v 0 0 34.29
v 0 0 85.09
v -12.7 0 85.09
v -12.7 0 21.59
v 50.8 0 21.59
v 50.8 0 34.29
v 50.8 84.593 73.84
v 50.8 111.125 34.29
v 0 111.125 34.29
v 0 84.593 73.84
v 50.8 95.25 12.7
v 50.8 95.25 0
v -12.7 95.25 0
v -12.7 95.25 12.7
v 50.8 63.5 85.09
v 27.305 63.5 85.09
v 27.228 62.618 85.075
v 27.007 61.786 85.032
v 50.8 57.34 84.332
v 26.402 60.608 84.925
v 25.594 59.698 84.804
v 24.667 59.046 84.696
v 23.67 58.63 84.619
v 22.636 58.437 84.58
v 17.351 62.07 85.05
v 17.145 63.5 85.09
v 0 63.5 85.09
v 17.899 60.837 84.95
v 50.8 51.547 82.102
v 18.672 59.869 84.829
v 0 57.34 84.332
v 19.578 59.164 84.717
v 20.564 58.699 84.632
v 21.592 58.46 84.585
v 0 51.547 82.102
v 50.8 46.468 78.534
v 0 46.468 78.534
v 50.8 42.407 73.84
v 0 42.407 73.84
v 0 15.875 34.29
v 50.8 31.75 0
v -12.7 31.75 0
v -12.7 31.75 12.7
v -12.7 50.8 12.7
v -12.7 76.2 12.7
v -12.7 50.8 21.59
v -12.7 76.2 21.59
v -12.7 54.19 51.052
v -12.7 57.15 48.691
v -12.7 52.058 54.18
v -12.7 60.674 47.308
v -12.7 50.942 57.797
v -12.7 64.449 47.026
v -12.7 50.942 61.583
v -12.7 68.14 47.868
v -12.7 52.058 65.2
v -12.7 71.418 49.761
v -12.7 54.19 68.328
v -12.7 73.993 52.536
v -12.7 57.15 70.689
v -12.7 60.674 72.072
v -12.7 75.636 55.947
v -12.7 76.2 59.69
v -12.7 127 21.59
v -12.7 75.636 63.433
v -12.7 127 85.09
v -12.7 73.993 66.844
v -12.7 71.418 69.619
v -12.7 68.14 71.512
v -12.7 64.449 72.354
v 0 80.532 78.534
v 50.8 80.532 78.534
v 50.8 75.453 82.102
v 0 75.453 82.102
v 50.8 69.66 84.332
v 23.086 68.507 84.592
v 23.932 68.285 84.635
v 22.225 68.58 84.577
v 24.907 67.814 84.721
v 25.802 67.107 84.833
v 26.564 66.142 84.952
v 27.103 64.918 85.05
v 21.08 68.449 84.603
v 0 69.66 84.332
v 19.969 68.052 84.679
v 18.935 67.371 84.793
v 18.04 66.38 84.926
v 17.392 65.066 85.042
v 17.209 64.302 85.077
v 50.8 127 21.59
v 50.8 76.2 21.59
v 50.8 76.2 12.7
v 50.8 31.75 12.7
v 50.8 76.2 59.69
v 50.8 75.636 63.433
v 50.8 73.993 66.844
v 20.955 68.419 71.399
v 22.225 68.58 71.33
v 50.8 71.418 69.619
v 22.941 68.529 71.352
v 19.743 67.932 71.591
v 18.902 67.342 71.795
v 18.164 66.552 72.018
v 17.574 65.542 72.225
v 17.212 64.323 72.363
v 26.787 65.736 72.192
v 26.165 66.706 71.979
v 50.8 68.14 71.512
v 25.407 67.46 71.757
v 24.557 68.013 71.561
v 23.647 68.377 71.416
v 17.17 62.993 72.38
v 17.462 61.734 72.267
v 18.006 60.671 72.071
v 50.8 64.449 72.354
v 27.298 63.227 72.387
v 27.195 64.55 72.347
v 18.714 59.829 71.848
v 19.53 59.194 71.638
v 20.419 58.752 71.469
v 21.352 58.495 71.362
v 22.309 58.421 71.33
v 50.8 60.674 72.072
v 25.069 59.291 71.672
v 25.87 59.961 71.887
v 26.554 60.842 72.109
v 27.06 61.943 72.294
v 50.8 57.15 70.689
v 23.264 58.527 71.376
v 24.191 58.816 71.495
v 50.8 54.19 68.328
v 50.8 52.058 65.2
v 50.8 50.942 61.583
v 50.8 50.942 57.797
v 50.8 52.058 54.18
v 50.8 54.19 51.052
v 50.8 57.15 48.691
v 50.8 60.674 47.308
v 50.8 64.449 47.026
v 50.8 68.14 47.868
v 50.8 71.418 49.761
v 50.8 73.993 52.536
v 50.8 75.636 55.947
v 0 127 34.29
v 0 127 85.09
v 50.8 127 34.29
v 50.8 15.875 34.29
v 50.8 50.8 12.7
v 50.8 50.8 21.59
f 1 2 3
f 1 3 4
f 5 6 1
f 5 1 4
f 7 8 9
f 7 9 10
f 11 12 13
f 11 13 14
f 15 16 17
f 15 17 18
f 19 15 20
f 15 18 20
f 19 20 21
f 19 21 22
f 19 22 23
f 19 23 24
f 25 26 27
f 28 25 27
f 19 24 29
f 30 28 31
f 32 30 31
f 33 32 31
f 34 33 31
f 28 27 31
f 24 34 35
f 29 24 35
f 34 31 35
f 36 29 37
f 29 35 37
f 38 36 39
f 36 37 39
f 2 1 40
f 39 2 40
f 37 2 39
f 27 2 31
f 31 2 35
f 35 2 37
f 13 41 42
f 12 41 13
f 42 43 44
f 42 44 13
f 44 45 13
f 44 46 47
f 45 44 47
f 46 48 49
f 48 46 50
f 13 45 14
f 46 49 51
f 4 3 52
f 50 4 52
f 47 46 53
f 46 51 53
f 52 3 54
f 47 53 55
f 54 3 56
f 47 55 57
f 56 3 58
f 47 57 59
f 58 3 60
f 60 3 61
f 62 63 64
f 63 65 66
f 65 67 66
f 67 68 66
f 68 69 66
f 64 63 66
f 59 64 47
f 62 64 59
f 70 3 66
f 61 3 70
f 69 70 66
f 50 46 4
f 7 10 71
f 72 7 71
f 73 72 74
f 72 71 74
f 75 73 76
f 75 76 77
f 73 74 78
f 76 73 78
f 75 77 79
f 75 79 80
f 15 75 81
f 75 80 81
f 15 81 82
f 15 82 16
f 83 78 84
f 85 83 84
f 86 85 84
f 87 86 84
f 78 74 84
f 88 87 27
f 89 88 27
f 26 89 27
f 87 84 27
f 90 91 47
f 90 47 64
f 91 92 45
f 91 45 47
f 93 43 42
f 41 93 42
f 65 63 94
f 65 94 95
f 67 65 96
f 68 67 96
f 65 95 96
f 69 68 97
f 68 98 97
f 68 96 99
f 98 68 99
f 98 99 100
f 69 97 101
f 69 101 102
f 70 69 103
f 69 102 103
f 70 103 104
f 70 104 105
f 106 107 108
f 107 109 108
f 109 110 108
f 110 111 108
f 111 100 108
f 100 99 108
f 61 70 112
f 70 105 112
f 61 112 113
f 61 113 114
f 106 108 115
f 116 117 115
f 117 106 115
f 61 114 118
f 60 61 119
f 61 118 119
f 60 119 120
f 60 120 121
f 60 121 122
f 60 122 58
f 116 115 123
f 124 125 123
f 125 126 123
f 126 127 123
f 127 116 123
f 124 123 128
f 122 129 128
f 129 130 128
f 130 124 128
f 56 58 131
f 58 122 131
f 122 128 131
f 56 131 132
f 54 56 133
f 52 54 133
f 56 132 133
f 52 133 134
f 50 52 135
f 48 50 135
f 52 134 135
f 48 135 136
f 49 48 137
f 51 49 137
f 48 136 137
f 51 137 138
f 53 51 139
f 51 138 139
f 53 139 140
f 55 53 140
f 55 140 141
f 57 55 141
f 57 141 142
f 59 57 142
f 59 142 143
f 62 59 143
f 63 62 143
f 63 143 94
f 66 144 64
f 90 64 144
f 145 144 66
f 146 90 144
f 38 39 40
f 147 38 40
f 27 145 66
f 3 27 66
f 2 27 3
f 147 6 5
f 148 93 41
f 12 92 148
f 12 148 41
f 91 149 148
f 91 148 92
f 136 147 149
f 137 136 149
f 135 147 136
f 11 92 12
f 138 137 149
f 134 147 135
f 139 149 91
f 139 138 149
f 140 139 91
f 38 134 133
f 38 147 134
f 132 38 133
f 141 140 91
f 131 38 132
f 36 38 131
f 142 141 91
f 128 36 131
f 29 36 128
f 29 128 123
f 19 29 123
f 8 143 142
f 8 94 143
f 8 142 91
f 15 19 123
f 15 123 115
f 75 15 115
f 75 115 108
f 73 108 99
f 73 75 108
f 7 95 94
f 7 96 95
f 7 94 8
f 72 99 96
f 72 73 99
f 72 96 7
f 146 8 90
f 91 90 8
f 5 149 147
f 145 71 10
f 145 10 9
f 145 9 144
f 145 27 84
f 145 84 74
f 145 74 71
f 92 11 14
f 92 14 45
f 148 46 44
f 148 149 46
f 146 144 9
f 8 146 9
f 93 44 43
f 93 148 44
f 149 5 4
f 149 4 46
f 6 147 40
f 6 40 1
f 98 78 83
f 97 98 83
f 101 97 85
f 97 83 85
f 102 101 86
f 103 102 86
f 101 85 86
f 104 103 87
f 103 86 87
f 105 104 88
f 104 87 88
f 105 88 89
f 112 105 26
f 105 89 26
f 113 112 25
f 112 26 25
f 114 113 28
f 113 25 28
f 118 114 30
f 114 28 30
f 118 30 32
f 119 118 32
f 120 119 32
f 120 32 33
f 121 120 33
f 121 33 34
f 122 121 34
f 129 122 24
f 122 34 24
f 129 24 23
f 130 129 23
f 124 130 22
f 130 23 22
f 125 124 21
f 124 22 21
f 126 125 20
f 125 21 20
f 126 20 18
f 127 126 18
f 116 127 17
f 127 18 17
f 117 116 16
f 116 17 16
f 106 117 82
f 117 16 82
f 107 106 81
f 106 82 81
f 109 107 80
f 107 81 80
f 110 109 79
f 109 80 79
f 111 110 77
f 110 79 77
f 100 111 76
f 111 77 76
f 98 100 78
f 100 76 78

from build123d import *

# Parameters (mm, degrees)
F0_R     = 12.7
F1_DEPTH = 50.8
F2_DEPTH = 12.7
F3_R     = 5.08
F4_DEPTH = 13.7612578348
F5_ANGLE = 90


with BuildPart() as f1:
    # F0 (on Front) → F1 (new body)
    with BuildSketch(Plane.XZ):
        with BuildLine():
            Line((31.75, 12.7), (31.75, 0))
            Line((31.75, 0), (95.25, 0))
            Line((95.25, 0), (95.25, 12.7))
            Line((95.25, 12.7), (76.2, 12.7))
            Line((76.2, 12.7), (76.2, 21.59))
            Line((76.2, 21.59), (127, 21.59))
            Line((127, 21.59), (127, 34.29))
            Line((127, 34.29), (111.125, 34.29))
            Line((111.125, 34.29), (84.5934256055, 73.8401730104))
            ThreePointArc((84.5934256055, 73.8401730104), (75.4529411765, 82.1017647059), (63.5, 85.09))
            ThreePointArc((63.5, 85.09), (51.5470588235, 82.1017647059), (42.4065743945, 73.8401730104))
            Line((42.4065743945, 73.8401730104), (15.875, 34.29))
            Line((15.875, 34.29), (0, 34.29))
            Line((0, 34.29), (0, 21.59))
            Line((0, 21.59), (50.8, 21.59))
            Line((50.8, 21.59), (50.8, 12.7))
            Line((50.8, 12.7), (31.75, 12.7))
        make_face()
        with Locations((63.5, 59.69)):
            Circle(F0_R, mode=Mode.SUBTRACT)
    extrude(amount=F1_DEPTH)

    # F0 (on Front) → F2 (join)
    with BuildSketch(Plane.XZ):
        with BuildLine():
            Line((31.75, 12.7), (31.75, 0))
            Line((31.75, 0), (95.25, 0))
            Line((95.25, 0), (95.25, 12.7))
            Line((95.25, 12.7), (76.2, 12.7))
            Line((76.2, 12.7), (76.2, 21.59))
            Line((76.2, 21.59), (127, 21.59))
            Line((127, 21.59), (127, 34.29))
            Line((127, 34.29), (111.125, 34.29))
            Line((111.125, 34.29), (84.5934256055, 73.8401730104))
            ThreePointArc((84.5934256055, 73.8401730104), (75.4529411765, 82.1017647059), (63.5, 85.09))
            ThreePointArc((63.5, 85.09), (51.5470588235, 82.1017647059), (42.4065743945, 73.8401730104))
            Line((42.4065743945, 73.8401730104), (15.875, 34.29))
            Line((15.875, 34.29), (0, 34.29))
            Line((0, 34.29), (0, 21.59))
            Line((0, 21.59), (50.8, 21.59))
            Line((50.8, 21.59), (50.8, 12.7))
            Line((50.8, 12.7), (31.75, 12.7))
        make_face()
        with Locations((63.5, 59.69)):
            Circle(F0_R, mode=Mode.SUBTRACT)
        with BuildLine():
            Line((0, 85.09), (0, 34.29))
            Line((0, 34.29), (15.875, 34.29))
            Line((15.875, 34.29), (42.4065743945, 73.8401730104))
            ThreePointArc((42.4065743945, 73.8401730104), (51.5470588235, 82.1017647059), (63.5, 85.09))
            Line((63.5, 85.09), (0, 85.09))
        make_face()
        with BuildLine():
            Line((111.125, 34.29), (127, 34.29))
            Line((127, 34.29), (127, 85.09))
            Line((127, 85.09), (63.5, 85.09))
            ThreePointArc((63.5, 85.09), (75.4529411765, 82.1017647059), (84.5934256055, 73.8401730104))
            Line((84.5934256055, 73.8401730104), (111.125, 34.29))
        make_face()
    extrude(amount=-F2_DEPTH)

    # F3 (on face) → F4 (cut, through all)
    with BuildSketch(Plane.XY.offset(85.09)):
        with Locations((63.5, -22.225)):
            Circle(F3_R)
    extrude(amount=-F4_DEPTH, mode=Mode.SUBTRACT)


with BuildPart() as f1_1:
    # F5: moved
    add(f1.part.rotate(Axis((0, 0, 59.69), (0, 0, 1)), F5_ANGLE))


solid = f1_1.part
